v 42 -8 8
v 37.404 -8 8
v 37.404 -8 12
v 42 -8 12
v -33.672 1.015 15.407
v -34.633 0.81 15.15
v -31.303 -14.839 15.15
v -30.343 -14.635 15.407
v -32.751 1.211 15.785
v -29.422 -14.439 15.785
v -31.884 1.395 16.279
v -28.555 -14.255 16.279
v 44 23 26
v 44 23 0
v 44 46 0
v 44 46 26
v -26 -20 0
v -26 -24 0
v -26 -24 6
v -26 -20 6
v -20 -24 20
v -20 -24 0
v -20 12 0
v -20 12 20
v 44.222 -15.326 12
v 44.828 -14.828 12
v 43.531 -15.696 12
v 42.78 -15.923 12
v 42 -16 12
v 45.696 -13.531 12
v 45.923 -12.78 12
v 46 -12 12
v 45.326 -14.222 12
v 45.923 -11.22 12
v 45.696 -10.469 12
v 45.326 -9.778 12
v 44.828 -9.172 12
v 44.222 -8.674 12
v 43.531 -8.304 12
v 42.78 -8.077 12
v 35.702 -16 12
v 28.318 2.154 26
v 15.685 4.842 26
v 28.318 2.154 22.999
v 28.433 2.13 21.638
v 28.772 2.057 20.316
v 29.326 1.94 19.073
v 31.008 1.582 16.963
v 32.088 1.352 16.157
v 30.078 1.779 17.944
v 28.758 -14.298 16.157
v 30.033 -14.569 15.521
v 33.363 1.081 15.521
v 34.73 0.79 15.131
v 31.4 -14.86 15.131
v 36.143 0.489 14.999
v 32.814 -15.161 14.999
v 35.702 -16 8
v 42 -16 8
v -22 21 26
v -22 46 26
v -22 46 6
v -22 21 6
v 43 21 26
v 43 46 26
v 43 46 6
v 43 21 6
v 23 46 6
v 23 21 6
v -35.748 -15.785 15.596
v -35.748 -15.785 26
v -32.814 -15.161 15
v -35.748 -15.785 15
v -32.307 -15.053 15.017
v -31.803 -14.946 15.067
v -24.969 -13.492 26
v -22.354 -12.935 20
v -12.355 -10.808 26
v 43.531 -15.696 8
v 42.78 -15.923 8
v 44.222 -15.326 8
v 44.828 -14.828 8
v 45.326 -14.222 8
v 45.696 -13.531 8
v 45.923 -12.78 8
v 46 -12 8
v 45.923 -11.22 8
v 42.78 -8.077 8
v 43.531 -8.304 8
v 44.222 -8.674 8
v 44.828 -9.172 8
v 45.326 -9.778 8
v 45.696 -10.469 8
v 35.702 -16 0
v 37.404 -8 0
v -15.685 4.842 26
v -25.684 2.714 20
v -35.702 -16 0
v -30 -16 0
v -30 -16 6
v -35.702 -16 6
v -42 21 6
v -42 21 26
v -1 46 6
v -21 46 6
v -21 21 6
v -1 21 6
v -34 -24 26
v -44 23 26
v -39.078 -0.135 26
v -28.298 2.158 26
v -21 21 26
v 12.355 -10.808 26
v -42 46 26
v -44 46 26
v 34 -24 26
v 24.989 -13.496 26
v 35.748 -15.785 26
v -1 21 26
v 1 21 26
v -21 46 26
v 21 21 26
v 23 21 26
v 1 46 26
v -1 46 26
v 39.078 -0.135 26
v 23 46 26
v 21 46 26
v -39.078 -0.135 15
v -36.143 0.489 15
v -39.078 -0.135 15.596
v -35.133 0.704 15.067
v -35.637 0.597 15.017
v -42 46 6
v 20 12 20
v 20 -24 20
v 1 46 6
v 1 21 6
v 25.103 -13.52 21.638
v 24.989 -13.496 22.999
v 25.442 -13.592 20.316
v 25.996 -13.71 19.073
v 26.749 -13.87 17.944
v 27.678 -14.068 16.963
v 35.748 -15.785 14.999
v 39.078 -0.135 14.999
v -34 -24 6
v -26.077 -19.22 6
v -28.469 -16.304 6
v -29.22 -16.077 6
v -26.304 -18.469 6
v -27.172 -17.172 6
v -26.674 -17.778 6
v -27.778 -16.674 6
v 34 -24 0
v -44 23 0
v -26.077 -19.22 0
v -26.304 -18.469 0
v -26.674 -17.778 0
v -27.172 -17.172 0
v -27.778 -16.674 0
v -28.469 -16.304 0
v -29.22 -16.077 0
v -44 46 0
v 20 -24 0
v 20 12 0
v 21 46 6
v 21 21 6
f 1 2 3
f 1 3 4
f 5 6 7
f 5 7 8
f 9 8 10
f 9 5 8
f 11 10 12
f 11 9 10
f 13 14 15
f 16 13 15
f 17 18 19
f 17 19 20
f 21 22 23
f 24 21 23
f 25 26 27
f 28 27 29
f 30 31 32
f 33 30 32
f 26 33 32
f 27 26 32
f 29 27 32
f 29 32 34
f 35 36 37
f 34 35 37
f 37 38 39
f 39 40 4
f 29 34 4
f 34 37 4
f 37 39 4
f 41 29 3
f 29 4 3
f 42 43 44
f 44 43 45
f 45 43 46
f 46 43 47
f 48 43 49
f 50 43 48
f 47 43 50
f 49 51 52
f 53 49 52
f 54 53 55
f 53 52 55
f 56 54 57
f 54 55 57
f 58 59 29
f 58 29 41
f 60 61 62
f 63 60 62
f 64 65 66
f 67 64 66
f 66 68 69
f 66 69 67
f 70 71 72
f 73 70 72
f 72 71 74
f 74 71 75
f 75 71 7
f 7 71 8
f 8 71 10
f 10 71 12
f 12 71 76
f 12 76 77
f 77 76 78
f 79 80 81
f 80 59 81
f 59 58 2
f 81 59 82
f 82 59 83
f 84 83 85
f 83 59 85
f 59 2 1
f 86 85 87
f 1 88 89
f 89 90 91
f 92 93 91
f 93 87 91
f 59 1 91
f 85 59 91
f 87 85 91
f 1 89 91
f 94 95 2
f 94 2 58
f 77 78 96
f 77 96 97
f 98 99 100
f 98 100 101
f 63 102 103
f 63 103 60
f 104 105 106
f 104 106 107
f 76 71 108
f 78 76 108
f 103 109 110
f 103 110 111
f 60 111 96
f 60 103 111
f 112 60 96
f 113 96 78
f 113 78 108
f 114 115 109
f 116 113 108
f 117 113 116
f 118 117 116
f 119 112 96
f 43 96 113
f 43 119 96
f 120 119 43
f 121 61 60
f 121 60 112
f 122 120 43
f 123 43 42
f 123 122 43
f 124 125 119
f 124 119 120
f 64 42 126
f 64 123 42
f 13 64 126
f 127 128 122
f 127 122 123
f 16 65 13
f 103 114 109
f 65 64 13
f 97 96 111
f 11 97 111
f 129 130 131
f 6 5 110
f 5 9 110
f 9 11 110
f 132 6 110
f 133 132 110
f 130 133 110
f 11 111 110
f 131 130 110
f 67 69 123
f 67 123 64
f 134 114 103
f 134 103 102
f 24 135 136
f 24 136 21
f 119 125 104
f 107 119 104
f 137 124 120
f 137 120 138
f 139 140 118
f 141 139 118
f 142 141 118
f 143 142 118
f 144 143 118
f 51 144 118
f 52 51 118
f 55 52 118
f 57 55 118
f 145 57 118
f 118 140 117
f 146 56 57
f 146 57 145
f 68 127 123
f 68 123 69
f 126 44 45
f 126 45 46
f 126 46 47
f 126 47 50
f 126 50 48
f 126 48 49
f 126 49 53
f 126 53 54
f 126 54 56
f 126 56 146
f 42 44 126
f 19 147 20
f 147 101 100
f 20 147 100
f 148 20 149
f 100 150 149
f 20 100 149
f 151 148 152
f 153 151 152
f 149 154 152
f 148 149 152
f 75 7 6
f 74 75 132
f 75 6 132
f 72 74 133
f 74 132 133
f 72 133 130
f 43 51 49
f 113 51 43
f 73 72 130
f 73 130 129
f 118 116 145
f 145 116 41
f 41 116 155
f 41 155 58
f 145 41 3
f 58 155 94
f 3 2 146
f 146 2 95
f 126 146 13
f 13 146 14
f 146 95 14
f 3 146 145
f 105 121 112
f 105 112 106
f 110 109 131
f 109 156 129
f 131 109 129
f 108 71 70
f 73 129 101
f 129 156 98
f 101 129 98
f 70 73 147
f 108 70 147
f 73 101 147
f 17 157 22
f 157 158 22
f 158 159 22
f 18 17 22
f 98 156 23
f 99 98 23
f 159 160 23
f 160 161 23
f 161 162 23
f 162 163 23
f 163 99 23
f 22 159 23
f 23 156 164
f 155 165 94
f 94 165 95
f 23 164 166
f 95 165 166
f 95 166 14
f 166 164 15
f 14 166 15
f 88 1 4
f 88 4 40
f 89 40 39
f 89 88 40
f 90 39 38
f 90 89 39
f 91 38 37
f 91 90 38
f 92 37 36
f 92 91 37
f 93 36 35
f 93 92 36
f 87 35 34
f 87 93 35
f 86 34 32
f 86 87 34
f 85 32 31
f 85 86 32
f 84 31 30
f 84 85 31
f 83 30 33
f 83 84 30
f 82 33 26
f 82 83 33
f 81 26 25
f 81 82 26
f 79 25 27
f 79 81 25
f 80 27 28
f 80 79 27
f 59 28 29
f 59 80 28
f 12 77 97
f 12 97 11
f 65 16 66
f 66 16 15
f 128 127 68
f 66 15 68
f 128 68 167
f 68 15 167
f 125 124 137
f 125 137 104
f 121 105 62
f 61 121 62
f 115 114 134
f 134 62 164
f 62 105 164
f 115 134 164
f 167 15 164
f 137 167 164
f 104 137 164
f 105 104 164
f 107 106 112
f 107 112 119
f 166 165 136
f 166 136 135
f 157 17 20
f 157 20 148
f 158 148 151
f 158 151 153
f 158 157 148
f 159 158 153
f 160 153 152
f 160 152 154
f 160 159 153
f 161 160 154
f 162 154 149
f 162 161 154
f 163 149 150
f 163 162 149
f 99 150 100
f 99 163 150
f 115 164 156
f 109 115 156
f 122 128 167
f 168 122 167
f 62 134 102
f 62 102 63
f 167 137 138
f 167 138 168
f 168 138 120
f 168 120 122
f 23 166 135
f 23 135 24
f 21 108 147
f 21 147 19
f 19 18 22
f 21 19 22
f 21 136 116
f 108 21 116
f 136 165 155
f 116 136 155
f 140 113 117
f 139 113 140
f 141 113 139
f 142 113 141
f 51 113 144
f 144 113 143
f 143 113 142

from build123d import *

# Parameters (mm, degrees)
EXTRUDE_1_DEPTH      = 26
SKETCH_3_W           = 40
SKETCH_3_H           = 36
CUT_EXTRUDE_4_DEPTH  = 20
SKETCH_4_W           = 20
SKETCH_4_H           = 20
CUT_EXTRUDE_5_DEPTH  = 25
CUT_EXTRUDE_3_DEPTH  = 8
CUT_EXTRUDE_6_DEPTH  = 8
CUT_EXTRUDE_7_DEPTH  = 16
CUT_EXTRUDE_8_DEPTH  = 16
CUT_EXTRUDE_9_DEPTH  = 6
EXTRUDE_2_DEPTH      = 12
CUT_EXTRUDE_10_DEPTH = 8


with BuildPart() as part:
    # 草图1 → 凸台-拉伸1 (new body)
    with BuildSketch(Plane.XY):
        Polygon((-34, -24), (34, -24), (44, 23), (44, 46), (-44, 46), (-44, 23), align=None)
    extrude(amount=EXTRUDE_1_DEPTH)

    # 草图3 → 切除-拉伸4 (cut)
    with BuildSketch(Plane(origin=(0, 0, 0), x_dir=(-1, 0, 0), z_dir=(0, 0, -1))):
        with Locations((0, -6)):
            Rectangle(SKETCH_3_W, SKETCH_3_H)
    extrude(amount=-CUT_EXTRUDE_4_DEPTH, mode=Mode.SUBTRACT)

    # 草图4 → 切除-拉伸5 (cut)
    with BuildSketch(Plane(origin=(0, 46, 0), x_dir=(1, 0, 0), z_dir=(0, 1, 0))):
        with Locations((33, -16)):
            Rectangle(SKETCH_4_W, SKETCH_4_H)
        with Locations((11, -16)):
            Rectangle(SKETCH_4_W, SKETCH_4_H)
        with Locations((-11, -16)):
            Rectangle(SKETCH_4_W, SKETCH_4_H)
        with Locations((-32, -16)):
            Rectangle(SKETCH_4_W, SKETCH_4_H)
    extrude(amount=-CUT_EXTRUDE_5_DEPTH, mode=Mode.SUBTRACT)

    # Sketch 3D_5 → 切除-拉伸3 (cut, symmetric)
    with BuildSketch(Plane(origin=(-26.633413551, -5.666683734, 23.004025099), x_dir=(-0.691625335103945, -0.14715432661786076, 0.7071067811865475), z_dir=(-0.2081076444648591, 0.9781059289848354, 0))):
        with BuildLine():
            Line((0, 0), (5.656854249, 5.656854249))
            Line((5.656854249, 5.656854249), (11.313708499, 0))
            ThreePointArc((11.313708499, 0), (5.656854249, -13.656854249), (0, 0))
        make_face()
    extrude(amount=CUT_EXTRUDE_3_DEPTH, both=True, mode=Mode.SUBTRACT)

    # Sketch 3D_6 → 切除-拉伸6 (cut, symmetric)
    with BuildSketch(Plane(origin=(34.478414998, -7.335832978, 14.99907516), x_dir=(0.5895982688198705, -0.12544644017993214, 0.7978954016979886), z_dir=(-0.20810764446495697, -0.9781059289848145, -6.6559639472978385e-12))):
        with BuildLine():
            Line((0, 0), (6.376045072, -8.439700449))
            Line((6.376045072, -8.439700449), (17.547318622, 0))
            Line((17.547318622, 0), (11.17127355, 8.439700449))
            Line((11.17127355, 8.439700449), (6.348906145, 14.822863662))
            Line((6.348906145, 14.822863662), (1.560795809, 11.205530619))
            ThreePointArc((1.560795809, 11.205530619), (-1.540343474, 5.926016705), (0, 0))
        make_face()
    extrude(amount=CUT_EXTRUDE_6_DEPTH, both=True, mode=Mode.SUBTRACT)

    # 草图7 → 切除-拉伸7 (cut)
    with BuildSketch(Plane(origin=(-1.664861156, 7.824847432, 0), x_dir=(0.9781059289848355, 0.2081076444648587, 0), z_dir=(0.2081076444648587, -0.9781059289848355, 0))):
        with BuildLine():
            Line((-24.556702047, 20), (-31.200844281, 16.10051891))
            ThreePointArc((-31.200844281, 16.10051891), (-33.152072653, 15.280030806), (-35.250185053, 15))
            Line((-35.250185053, 15), (-43.250185053, 15))
            Line((-43.250185053, 15), (-43.250185053, 23))
            ThreePointArc((-43.250185053, 23), (-40.3181561, 29.189965223), (-33.671267687, 30.842641134))
            Line((-33.671267687, 30.842641134), (-10.087245225, 28.492198282))
            Line((-10.087245225, 28.492198282), (-24.556702047, 20))
        make_face()
    extrude(amount=CUT_EXTRUDE_7_DEPTH, mode=Mode.SUBTRACT)

    # 草图11 → 切除-拉伸8 (cut)
    with BuildSketch(Plane(origin=(-1.664861156, -7.824847432, 0), x_dir=(0.9781059289845859, -0.2081076444660318, -1.1269708570671002e-12), z_dir=(0.20810764446603178, 0.9781059289845858, 5.296763028184159e-12))):
        with BuildLine():
            Line((31.200844283, -16.100518909), (14.333584528, -26))
            Line((14.333584528, -26), (32.666556858, -30.571318601))
            ThreePointArc((32.666556858, -30.571318601), (42.196349228, -26.968728166), (40.460809076, -16.92962956))
            Line((40.460809076, -16.92962956), (38.250185053, -14.99907516))
            Line((38.250185053, -14.99907516), (35.250185053, -15))
            ThreePointArc((35.250185053, -15), (33.152072655, -15.280030806), (31.200844283, -16.100518909))
        make_face()
    extrude(amount=CUT_EXTRUDE_8_DEPTH, mode=Mode.SUBTRACT)

    # 草图12 → 切除-拉伸9 (cut)
    with BuildSketch(Plane(origin=(0, 0, 0), x_dir=(-1, 0, 0), z_dir=(0, 0, -1))):
        with BuildLine():
            Line((34, -16), (36.935033059, -16))
            Line((36.935033059, -16), (34, -24))
            Line((34, -24), (26, -24))
            Line((26, -24), (26, -20))
            ThreePointArc((26, -20), (27.171572875, -17.171572875), (30, -16))
            Line((30, -16), (34, -16))
        make_face()
    extrude(amount=-CUT_EXTRUDE_9_DEPTH, mode=Mode.SUBTRACT)

    # 草图13 → 凸台-拉伸2 (add)
    with BuildSketch(Plane(origin=(0, 0, 0), x_dir=(-1, 0, 0), z_dir=(0, 0, -1))):
        with BuildLine():
            Line((-34, -8), (-42, -8))
            ThreePointArc((-42, -8), (-46, -12), (-42, -16))
            Line((-42, -16), (-34, -16))
            Line((-34, -16), (-34, -8))
        make_face()
    extrude(amount=-EXTRUDE_2_DEPTH)

    # 草图14 → 切除-拉伸10 (cut)
    with BuildSketch(Plane(origin=(0, 0, 0), x_dir=(-1, 0, 0), z_dir=(0, 0, -1))):
        Polygon((-37.404255319, -8), (-35.70212766, -16), (-61.438279543, -16), (-61.438279543, -8), align=None)
    extrude(amount=-CUT_EXTRUDE_10_DEPTH, mode=Mode.SUBTRACT)


solid = part.part
